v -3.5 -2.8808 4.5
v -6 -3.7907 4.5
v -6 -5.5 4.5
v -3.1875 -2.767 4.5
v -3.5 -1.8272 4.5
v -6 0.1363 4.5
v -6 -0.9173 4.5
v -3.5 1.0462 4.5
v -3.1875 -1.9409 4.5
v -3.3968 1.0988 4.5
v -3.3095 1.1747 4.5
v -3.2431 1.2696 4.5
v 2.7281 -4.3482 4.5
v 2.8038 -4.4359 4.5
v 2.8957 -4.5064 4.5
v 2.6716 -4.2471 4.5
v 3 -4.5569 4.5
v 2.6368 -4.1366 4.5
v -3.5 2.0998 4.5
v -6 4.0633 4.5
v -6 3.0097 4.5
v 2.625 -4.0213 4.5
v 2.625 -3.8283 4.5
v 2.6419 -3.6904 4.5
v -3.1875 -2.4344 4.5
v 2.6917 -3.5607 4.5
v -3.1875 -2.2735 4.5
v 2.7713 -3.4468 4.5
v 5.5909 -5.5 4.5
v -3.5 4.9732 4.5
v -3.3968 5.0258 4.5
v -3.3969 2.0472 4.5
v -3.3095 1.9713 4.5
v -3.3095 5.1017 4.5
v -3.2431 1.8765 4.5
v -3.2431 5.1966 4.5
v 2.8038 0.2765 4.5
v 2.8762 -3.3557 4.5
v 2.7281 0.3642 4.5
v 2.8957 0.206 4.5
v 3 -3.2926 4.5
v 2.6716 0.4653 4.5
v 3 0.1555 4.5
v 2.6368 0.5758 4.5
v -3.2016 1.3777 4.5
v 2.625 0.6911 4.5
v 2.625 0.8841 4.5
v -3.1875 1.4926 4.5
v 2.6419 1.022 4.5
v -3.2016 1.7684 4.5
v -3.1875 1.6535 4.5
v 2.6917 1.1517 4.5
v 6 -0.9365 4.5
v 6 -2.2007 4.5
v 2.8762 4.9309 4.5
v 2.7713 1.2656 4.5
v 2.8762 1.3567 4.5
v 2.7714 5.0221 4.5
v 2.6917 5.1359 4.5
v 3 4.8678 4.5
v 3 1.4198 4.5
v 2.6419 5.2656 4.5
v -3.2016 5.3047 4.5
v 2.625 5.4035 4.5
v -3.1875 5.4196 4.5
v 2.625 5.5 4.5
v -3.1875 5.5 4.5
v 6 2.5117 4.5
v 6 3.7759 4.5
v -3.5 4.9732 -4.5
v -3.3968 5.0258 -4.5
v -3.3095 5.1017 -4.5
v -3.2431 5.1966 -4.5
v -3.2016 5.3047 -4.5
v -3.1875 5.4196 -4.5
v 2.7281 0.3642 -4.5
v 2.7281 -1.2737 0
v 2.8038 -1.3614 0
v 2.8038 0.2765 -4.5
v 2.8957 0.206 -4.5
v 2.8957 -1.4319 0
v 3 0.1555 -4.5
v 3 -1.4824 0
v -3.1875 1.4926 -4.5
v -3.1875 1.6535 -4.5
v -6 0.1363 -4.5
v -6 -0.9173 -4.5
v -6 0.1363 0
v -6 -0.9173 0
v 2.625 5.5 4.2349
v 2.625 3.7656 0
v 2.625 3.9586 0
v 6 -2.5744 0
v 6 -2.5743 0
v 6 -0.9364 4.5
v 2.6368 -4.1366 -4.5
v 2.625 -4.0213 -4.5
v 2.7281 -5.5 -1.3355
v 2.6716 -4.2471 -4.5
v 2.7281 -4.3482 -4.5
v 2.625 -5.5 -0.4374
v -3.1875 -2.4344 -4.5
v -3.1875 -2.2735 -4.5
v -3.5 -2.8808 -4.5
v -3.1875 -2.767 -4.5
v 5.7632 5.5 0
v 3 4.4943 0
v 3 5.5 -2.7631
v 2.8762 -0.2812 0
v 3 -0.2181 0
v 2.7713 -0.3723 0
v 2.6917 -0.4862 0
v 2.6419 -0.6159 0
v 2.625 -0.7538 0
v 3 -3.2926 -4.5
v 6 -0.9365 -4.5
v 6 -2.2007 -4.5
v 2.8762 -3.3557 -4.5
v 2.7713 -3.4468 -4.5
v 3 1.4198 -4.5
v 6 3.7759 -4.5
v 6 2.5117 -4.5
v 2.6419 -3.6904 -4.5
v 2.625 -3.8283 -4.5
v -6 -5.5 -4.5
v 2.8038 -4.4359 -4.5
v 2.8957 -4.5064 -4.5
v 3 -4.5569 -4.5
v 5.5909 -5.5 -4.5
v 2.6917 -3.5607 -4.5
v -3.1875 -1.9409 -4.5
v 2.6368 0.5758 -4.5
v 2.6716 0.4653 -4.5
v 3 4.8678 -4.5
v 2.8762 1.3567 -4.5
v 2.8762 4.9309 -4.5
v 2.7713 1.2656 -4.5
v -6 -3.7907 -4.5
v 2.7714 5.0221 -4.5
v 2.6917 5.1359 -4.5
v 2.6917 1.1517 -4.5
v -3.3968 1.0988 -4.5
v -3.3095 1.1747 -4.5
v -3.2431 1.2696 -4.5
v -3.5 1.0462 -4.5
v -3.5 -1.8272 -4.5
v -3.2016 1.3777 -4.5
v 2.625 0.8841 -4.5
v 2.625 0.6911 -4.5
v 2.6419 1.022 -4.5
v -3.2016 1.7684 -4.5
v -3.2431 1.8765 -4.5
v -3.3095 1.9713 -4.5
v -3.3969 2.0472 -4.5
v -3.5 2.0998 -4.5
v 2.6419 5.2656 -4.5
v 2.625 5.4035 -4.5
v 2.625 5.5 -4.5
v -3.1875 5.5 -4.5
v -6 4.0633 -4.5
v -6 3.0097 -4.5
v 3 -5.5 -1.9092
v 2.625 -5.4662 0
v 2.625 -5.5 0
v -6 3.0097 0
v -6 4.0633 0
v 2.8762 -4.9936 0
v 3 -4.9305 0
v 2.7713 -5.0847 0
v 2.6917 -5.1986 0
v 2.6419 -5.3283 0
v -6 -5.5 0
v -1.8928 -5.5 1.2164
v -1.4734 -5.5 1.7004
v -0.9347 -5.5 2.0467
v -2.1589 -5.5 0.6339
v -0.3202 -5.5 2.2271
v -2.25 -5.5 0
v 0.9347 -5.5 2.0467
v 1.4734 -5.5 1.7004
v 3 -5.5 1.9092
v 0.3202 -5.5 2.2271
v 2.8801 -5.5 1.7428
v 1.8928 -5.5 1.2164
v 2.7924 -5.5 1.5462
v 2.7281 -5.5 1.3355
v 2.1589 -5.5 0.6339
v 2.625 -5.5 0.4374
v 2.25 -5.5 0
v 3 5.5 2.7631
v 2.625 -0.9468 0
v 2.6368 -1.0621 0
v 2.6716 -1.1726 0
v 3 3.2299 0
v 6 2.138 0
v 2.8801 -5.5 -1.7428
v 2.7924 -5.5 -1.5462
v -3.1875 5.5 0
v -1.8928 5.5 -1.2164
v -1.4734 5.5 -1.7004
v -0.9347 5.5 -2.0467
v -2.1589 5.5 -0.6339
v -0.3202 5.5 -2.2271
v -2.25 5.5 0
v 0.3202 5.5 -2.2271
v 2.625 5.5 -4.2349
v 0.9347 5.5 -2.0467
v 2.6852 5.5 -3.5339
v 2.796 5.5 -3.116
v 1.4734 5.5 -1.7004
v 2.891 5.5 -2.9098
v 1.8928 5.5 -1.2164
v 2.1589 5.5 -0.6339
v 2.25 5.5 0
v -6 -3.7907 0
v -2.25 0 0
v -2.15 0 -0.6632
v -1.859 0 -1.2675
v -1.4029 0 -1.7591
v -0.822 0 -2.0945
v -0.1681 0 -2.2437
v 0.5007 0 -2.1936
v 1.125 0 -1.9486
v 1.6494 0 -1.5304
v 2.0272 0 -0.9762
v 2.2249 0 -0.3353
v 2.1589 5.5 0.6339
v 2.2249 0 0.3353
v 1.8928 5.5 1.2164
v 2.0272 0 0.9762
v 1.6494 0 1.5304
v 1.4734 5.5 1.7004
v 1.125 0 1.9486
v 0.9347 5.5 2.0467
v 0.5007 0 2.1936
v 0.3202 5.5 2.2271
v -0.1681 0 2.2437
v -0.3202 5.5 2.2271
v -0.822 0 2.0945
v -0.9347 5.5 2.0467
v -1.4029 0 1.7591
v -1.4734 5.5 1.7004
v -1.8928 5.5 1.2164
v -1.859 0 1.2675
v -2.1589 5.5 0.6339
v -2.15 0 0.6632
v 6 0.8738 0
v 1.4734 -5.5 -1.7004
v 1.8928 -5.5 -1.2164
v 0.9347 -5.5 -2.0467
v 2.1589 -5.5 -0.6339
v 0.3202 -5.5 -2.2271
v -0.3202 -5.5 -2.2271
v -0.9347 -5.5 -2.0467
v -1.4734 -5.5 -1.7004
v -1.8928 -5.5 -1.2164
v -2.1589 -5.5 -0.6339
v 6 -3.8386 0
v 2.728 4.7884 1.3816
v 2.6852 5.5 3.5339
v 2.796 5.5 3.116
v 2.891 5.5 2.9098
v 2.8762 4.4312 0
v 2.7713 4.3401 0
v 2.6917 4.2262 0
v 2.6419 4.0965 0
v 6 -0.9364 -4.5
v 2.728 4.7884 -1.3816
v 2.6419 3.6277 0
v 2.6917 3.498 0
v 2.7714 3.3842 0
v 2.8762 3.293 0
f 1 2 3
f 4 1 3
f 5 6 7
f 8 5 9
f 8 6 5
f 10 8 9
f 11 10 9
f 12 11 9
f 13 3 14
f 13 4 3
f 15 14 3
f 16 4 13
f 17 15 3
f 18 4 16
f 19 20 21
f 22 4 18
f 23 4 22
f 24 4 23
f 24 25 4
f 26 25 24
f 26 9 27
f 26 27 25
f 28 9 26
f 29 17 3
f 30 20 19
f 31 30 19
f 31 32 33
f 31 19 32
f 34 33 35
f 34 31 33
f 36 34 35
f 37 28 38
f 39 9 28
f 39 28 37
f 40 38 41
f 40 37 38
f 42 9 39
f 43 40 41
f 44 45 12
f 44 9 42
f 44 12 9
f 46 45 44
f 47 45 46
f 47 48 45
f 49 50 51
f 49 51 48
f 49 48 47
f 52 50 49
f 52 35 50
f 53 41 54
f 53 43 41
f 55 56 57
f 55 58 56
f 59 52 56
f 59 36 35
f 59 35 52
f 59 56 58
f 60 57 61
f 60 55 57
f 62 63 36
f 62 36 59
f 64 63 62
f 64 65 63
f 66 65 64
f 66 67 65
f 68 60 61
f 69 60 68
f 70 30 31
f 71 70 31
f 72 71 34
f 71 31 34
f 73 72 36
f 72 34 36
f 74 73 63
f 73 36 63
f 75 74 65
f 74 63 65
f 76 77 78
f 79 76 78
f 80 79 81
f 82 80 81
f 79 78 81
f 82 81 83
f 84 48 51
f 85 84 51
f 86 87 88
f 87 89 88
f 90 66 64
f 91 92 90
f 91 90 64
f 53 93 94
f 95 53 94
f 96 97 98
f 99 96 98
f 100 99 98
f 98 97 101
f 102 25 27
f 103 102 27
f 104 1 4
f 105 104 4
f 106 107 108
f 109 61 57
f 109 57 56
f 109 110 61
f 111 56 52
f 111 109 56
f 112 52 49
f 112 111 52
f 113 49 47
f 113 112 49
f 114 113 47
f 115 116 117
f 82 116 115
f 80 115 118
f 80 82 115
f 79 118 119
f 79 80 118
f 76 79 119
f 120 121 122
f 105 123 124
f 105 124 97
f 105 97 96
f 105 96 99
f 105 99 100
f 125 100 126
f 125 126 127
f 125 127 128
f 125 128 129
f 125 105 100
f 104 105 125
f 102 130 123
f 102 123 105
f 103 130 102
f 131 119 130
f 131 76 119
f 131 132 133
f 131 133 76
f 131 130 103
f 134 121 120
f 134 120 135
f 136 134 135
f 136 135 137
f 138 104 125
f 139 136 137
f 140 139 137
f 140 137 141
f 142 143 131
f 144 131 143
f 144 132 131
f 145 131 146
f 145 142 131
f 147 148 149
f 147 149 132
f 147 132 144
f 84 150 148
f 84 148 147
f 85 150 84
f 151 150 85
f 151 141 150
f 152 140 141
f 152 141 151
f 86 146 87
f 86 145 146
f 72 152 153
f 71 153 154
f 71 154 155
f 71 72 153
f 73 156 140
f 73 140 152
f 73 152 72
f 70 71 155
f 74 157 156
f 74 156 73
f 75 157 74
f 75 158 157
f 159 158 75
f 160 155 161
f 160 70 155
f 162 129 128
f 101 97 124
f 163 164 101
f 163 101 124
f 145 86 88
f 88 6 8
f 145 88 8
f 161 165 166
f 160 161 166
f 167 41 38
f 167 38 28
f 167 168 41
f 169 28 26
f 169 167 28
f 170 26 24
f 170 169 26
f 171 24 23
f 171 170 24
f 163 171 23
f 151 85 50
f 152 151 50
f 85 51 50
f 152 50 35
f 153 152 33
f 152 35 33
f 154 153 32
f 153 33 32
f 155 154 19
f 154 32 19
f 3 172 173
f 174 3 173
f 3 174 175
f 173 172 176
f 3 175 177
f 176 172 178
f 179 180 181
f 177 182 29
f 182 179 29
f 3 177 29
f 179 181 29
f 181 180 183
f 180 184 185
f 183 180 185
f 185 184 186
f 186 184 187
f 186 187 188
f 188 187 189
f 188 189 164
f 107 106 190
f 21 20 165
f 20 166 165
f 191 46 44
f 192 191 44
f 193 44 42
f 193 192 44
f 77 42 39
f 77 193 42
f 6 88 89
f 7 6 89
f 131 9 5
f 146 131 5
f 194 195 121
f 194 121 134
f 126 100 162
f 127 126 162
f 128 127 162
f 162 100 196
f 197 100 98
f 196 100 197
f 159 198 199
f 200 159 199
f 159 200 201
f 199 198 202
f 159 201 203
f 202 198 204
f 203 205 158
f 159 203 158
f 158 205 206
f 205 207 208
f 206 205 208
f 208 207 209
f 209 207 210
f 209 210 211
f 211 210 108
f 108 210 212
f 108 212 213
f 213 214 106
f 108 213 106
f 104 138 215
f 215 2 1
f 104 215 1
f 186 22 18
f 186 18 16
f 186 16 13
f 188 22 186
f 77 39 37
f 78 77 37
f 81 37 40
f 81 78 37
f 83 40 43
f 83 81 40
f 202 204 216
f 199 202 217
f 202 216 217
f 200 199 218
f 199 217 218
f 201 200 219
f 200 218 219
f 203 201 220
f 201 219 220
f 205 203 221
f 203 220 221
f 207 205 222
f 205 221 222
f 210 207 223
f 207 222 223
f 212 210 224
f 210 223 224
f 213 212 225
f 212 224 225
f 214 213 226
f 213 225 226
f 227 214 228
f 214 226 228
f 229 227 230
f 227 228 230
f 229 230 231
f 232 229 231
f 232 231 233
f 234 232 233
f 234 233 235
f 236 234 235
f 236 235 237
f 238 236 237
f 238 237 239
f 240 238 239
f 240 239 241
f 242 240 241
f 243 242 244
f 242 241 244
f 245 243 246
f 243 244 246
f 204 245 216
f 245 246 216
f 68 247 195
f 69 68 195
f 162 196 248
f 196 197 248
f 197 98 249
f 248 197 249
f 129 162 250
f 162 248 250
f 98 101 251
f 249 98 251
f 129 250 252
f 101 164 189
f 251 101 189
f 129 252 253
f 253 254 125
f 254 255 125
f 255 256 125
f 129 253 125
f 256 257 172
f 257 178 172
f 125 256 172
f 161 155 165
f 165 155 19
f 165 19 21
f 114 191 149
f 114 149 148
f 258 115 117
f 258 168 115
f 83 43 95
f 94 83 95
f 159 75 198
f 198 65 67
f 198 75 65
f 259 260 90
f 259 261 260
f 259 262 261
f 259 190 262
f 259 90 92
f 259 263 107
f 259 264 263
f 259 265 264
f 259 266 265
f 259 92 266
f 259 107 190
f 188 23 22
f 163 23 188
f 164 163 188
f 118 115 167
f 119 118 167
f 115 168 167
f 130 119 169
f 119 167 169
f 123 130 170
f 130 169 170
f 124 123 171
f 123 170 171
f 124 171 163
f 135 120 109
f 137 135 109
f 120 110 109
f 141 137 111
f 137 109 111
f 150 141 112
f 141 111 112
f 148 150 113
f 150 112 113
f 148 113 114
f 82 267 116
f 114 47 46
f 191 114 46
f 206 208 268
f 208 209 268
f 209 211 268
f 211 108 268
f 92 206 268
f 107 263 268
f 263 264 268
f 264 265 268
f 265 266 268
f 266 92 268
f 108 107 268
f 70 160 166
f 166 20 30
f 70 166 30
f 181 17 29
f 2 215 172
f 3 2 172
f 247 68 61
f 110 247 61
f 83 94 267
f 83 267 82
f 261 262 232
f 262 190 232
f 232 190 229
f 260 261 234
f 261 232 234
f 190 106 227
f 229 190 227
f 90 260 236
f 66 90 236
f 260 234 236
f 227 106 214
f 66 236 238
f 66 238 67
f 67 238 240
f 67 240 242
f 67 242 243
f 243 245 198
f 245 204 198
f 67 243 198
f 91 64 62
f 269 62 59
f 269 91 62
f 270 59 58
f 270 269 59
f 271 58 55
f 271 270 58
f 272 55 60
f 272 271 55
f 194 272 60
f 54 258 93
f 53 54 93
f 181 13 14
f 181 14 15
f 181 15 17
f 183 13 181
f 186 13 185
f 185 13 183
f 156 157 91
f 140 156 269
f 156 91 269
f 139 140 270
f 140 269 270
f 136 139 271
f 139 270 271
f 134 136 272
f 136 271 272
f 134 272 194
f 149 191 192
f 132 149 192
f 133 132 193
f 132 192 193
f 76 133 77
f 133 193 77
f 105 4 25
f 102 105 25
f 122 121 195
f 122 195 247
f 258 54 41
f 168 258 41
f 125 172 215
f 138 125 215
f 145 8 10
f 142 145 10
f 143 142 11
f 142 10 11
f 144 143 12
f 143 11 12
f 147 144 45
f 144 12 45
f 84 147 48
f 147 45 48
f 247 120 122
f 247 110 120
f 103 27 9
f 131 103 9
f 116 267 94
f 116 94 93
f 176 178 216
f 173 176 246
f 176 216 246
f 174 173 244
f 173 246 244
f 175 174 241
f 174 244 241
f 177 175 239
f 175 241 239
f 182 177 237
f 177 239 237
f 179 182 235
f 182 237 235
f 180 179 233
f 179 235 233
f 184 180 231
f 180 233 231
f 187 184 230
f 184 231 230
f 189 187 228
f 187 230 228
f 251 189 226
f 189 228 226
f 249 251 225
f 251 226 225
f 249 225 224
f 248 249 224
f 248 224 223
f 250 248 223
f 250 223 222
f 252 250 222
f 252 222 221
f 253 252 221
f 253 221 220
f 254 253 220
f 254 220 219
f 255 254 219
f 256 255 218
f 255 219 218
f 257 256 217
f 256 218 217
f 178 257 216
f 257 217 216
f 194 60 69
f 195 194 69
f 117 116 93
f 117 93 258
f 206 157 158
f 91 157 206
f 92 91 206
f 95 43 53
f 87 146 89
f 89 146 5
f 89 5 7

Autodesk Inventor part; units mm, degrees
ref_plane "YZ Plane" through (0, 0, 0) normal (1, 0, 0) x (0, 1, 0)
ref_plane "XZ Plane" through (0, 0, 0) normal (0, 1, 0) x (-1, 0, 0)
ref_plane "XY Plane" through (0, 0, 0) normal (0, 0, 1) x (1, 0, 0)
sketch "Sketch1" plane through (0, 0, 0) normal (0, 0, 1) x (1, 0, 0)
  line L0 (-6, -5.5) -> (6, -5.5)
  line L1 (6, -5.5) -> (6, 5.5)
  line L2 (6, 5.5) -> (-6, 5.5)
  line L3 (-6, 5.5) -> (-6, -5.5)
  point P0 (0, 0)
  point P1 (-6, 0)
  point P2 (0, 5.5)
  dimension "d0" = 12
  dimension "d1" = 11
extrude "Extrusion1" add sketch "Sketch1" along normal blind 4.5
sketch "Sketch2" plane through (0, 0, 4.5) normal (0, 0, 1) x (1, 0, 0)
  line L0 (6, -5.5) -> (6, 5.5) projected
  line L1 (6, 5.5) -> (-6, 5.5) projected
  line L2 (-6, 5.5) -> (-6, -5.5) projected
  line L3 (-6, -5.5) -> (6, -5.5) projected
  line L4 (6, -5.5) -> (6, 5.5) projected
  line L5 (6, 7.2241) -> (2.625, 5.9957)
  line L6 (2.625, 5.9957) -> (2.625, 5.0043)
  line L7 (2.625, 5.0043) -> (6, 3.7759)
  line L8 (6, 2.5117) -> (2.625, 1.2833)
  line L9 (2.625, 1.2833) -> (2.625, 0.292)
  line L10 (2.625, 0.292) -> (6, -0.9364)
  arc A0 (3, 6.1322) -> (2.625, 5.5965) centre (3.195, 5.5965) ccw
  arc A1 (2.625, 5.4035) -> (3, 4.8678) centre (3.195, 5.4035) ccw
  line L11 (6, 5.5) -> (-6, 5.5) projected
  arc A2 (2.625, 0.6911) -> (3, 0.1555) centre (3.195, 0.6911) ccw
  arc A3 (3, 1.4198) -> (2.625, 0.8841) centre (3.195, 0.8841) ccw
  line L12 (6, 7.2241) -> (6, 3.7759)
  line L13 (0, 5.5) -> (0.4792, -5.5)
  line L14 (0, -5.5) -> (6, -5.5) projected
  line L15 (-6.1272, 6.6958) -> (-2.6582, 5.7655)
  line L16 (-2.6582, 5.7655) -> (-2.572, 4.778)
  line L17 (-2.572, 4.778) -> (-5.8274, 3.2607)
  arc A4 (-2.6235, 5.3679) -> (-3.0437, 5.8689) centre (-3.1913, 5.3183) ccw
  arc A5 (-2.9337, 4.6094) -> (-2.6067, 5.1756) centre (-3.1745, 5.126) ccw
  line L18 (-6.1272, 6.6958) -> (-5.8274, 3.2607)
  line L19 (-5.7174, 2.0012) -> (-2.2484, 1.071)
  line L20 (-2.2484, 1.071) -> (-2.1622, 0.0834)
  line L21 (-2.1622, 0.0834) -> (-5.4176, -1.4338)
  arc A6 (-2.5239, -0.0852) -> (-2.1969, 0.481) centre (-2.7647, 0.4315) ccw
  arc A7 (-2.2137, 0.6734) -> (-2.6339, 1.1744) centre (-2.7815, 0.6238) ccw
  point P0 (0, 0)
  point P1 (0, 0)
  point P2 (2.625, 5.5)
  point P3 (4.5, 4.3219)
  point P4 (4.5, 1.9657)
  point P5 (2.625, 5.5)
  point P6 (6, -0.9364)
  point P7 (-2.6151, 5.2717)
  point P8 (-4.3805, 3.9351)
  point P9 (-6, 5.2386)
  point P10 (0, 7.2759)
  point P11 (-4.1756, 1.5878)
  point P12 (0, 2.5636)
  point P13 (0, 6.0117)
  point P14 (4.5, -0.3905)
  dimension "d14" = 70
  dimension "d15" = 4.7124
  dimension "d16" = 0.57
  dimension "d17" = 3.375
  dimension "d18" = 1.5
  dimension "d19" = 2.3562
  dimension "d48" = 2.3562
sketch "Sketch3" plane through (6, -5.5, 0) normal (1, 0, 0) x (0, 0, -1)
  line L0 (-4.5, 0) -> (-4.5, 11) projected
  line L1 (-4.5, 11) -> (-4.5, 0) projected
  line L2 (-4.5, 4.5636) -> (0, 2.9257)
  line L3 (0, 5.5) -> (0, 11) projected
  line L4 (0, 11) -> (-4.5, 11) projected
  dimension "d31" = 20
sweep "Sweep1" cut profiles "Sketch2" path "Sketch3" path curves L2 contours L10 A2 L9 A3 L8 L0 | L7 A1 L6 L1 L0 | L6 A0 L5 L12 L1
pattern_linear "Rectangular Pattern2" count 8 spacing 4.7124 along (0, -1, 0) of "Sweep1"
mirror "Mirror2" about plane through (0, 0, 0) normal (0, 0, -1)
ref_plane "Work Plane3" through (4.5, 2.8745, 4.5) normal (1, 0, 0) x (0, 0, -1)
sketch "Sketch6" plane through (0, 0, 4.5) normal (0, 0, 1) x (1, 0, 0)
  arc A0 (3, -3.2926) -> (2.625, -3.8283) centre (3.195, -3.8283) ccw projected
  line L0 (3, -3.2926) -> (6, -2.2007) projected
  line L1 (6, -2.2007) -> (6, -0.9364) projected
  line L2 (6, -0.9364) -> (3, 0.1555) projected
  arc A1 (2.625, 0.6911) -> (3, 0.1555) centre (3.195, 0.6911) ccw projected
  line L3 (2.625, 0.6911) -> (2.625, 0.8841) projected
  arc A2 (3, 1.4198) -> (2.625, 0.8841) centre (3.195, 0.8841) ccw projected
  line L4 (3, 1.4198) -> (6, 2.5117) projected
  line L5 (6, 2.5117) -> (6, 3.7759) projected
  line L6 (6, 3.7759) -> (3, 4.8678) projected
  arc A3 (2.625, 5.4035) -> (3, 4.8678) centre (3.195, 5.4035) ccw projected
  line L7 (2.625, 5.4035) -> (2.625, 5.5) projected
  line L8 (2.625, 5.5) -> (-6, 5.5) projected
  line L9 (-6, 5.5) -> (-6, -5.5) projected
  line L10 (-6, -5.5) -> (5.5911, -5.5) projected
  line L11 (-6, 4.0633) -> (-3.1875, 5.087)
  line L12 (-3.1875, 5.087) -> (-3.1875, 5.913)
  line L13 (2.625, 5.5) -> (-6, 5.5) projected
  line L14 (-3.1875, 5.913) -> (-6, 6.9367)
  line L15 (-6, 6.9367) -> (-6, 5.5)
  arc A4 (-3.5, 4.9732) -> (-3.1875, 5.4196) centre (-3.6625, 5.4196) ccw
  arc A5 (-3.1875, 5.5804) -> (-3.5, 6.0268) centre (-3.6625, 5.5804) ccw
  arc A6 (-3.5, 1.0462) -> (-3.1875, 1.4926) centre (-3.6625, 1.4926) ccw
  line L16 (-3.1875, 1.16) -> (-3.1875, 1.9861)
  arc A7 (-3.1875, 1.6535) -> (-3.5, 2.0998) centre (-3.6625, 1.6535) ccw
  line L17 (-3.1875, 1.9861) -> (-6, 3.0097)
  line L18 (-6, 3.0097) -> (-6, 1.573)
  line L19 (-6, 0.1363) -> (-3.1875, 1.16)
  arc A8 (-3.5, -2.8808) -> (-3.1875, -2.4344) centre (-3.6625, -2.4344) ccw
  line L20 (-3.1875, -2.767) -> (-3.1875, -1.9409)
  arc A9 (-3.1875, -2.2735) -> (-3.5, -1.8272) centre (-3.6625, -2.2735) ccw
  line L21 (-3.1875, -1.9409) -> (-6, -0.9173)
  line L22 (-6, -0.9173) -> (-6, -2.354)
  line L23 (-6, -3.7907) -> (-3.1875, -2.767)
  arc A10 (-3.5, -6.8078) -> (-3.1875, -6.3614) centre (-3.6625, -6.3614) ccw
  line L24 (-3.1875, -6.694) -> (-3.1875, -5.8679)
  arc A11 (-3.1875, -6.2005) -> (-3.5, -5.7542) centre (-3.6625, -6.2005) ccw
  line L25 (-3.1875, -5.8679) -> (-6, -4.8443)
  line L26 (-6, -4.8443) -> (-6, -6.281)
  line L27 (-6, -7.7177) -> (-3.1875, -6.694)
  line L28 (5.5911, -5.5) -> (3, -4.5569) projected
  arc A12 (2.625, -4.0213) -> (3, -4.5569) centre (3.195, -4.0213) ccw projected
  line L29 (2.625, -4.0213) -> (2.625, -3.8283) projected
  point P0 (0, 0)
  point P1 (-4.75, 6.4817)
  point P2 (-4.75, 4.5183)
  point P3 (-3.1875, 5.5)
  point P4 (-3.1875, 1.573)
  point P5 (-4.75, 2.5548)
  point P6 (-4.75, 0.5913)
  point P7 (-3.1875, -2.354)
  point P8 (-4.75, -1.3722)
  point P9 (-4.75, -3.3357)
  point P10 (-3.1875, -6.281)
  point P11 (-4.75, -5.2992)
  point P12 (-4.75, -7.2627)
  point P13 (-5.2013, -4.5)
  dimension "d50" = 70
  dimension "d51" = 1.25
  dimension "d52" = 1.5625
  dimension "d53" = 1.9635
  dimension "d54" = 0.475
  dimension "d57" = 3.927
extrude "Extrusion4" cut sketch "Sketch6" against normal blind 10 contours L9 L21 A9 L20 A8 L23 | A8 L20 L23 | L9 L17 A7 L16 A6 L19 | L21 L20 A9 | L12 A4 L11 L9 L8
ref_plane "Work Plane4" through (-4.75, 3.0097, -4.5) normal (-1, 0, 0) x (0, 0, 1)
sketch "Sketch7" plane through (0, 0, 0) normal (0, 1, 0) x (-1, 0, 0)
  circle A0 centre (0, 0) radius 2.25
  dimension "d65" = 4.5
extrude "Extrusion5" cut sketch "Sketch7" along normal through all both and the other way through all
equation "\"d15\" = 3.14159 * d18"
equation "\"d16\" = 0.38 * d18"
equation "\"d17\" = 2.25 * d18"
equation "\"d19\" = 0.5 * d15"
equation "\"d48\" = d19"
equation "\"d52\" = 1.25 * d51"
equation "\"d53\" = 1.5708 * d51"
equation "\"d54\" = 0.38 * d51"
equation "\"d57\" = 3.14159 * d51"
equation "\"d32\" = 20.5deg"
properties part number "rack_3DPrint"
